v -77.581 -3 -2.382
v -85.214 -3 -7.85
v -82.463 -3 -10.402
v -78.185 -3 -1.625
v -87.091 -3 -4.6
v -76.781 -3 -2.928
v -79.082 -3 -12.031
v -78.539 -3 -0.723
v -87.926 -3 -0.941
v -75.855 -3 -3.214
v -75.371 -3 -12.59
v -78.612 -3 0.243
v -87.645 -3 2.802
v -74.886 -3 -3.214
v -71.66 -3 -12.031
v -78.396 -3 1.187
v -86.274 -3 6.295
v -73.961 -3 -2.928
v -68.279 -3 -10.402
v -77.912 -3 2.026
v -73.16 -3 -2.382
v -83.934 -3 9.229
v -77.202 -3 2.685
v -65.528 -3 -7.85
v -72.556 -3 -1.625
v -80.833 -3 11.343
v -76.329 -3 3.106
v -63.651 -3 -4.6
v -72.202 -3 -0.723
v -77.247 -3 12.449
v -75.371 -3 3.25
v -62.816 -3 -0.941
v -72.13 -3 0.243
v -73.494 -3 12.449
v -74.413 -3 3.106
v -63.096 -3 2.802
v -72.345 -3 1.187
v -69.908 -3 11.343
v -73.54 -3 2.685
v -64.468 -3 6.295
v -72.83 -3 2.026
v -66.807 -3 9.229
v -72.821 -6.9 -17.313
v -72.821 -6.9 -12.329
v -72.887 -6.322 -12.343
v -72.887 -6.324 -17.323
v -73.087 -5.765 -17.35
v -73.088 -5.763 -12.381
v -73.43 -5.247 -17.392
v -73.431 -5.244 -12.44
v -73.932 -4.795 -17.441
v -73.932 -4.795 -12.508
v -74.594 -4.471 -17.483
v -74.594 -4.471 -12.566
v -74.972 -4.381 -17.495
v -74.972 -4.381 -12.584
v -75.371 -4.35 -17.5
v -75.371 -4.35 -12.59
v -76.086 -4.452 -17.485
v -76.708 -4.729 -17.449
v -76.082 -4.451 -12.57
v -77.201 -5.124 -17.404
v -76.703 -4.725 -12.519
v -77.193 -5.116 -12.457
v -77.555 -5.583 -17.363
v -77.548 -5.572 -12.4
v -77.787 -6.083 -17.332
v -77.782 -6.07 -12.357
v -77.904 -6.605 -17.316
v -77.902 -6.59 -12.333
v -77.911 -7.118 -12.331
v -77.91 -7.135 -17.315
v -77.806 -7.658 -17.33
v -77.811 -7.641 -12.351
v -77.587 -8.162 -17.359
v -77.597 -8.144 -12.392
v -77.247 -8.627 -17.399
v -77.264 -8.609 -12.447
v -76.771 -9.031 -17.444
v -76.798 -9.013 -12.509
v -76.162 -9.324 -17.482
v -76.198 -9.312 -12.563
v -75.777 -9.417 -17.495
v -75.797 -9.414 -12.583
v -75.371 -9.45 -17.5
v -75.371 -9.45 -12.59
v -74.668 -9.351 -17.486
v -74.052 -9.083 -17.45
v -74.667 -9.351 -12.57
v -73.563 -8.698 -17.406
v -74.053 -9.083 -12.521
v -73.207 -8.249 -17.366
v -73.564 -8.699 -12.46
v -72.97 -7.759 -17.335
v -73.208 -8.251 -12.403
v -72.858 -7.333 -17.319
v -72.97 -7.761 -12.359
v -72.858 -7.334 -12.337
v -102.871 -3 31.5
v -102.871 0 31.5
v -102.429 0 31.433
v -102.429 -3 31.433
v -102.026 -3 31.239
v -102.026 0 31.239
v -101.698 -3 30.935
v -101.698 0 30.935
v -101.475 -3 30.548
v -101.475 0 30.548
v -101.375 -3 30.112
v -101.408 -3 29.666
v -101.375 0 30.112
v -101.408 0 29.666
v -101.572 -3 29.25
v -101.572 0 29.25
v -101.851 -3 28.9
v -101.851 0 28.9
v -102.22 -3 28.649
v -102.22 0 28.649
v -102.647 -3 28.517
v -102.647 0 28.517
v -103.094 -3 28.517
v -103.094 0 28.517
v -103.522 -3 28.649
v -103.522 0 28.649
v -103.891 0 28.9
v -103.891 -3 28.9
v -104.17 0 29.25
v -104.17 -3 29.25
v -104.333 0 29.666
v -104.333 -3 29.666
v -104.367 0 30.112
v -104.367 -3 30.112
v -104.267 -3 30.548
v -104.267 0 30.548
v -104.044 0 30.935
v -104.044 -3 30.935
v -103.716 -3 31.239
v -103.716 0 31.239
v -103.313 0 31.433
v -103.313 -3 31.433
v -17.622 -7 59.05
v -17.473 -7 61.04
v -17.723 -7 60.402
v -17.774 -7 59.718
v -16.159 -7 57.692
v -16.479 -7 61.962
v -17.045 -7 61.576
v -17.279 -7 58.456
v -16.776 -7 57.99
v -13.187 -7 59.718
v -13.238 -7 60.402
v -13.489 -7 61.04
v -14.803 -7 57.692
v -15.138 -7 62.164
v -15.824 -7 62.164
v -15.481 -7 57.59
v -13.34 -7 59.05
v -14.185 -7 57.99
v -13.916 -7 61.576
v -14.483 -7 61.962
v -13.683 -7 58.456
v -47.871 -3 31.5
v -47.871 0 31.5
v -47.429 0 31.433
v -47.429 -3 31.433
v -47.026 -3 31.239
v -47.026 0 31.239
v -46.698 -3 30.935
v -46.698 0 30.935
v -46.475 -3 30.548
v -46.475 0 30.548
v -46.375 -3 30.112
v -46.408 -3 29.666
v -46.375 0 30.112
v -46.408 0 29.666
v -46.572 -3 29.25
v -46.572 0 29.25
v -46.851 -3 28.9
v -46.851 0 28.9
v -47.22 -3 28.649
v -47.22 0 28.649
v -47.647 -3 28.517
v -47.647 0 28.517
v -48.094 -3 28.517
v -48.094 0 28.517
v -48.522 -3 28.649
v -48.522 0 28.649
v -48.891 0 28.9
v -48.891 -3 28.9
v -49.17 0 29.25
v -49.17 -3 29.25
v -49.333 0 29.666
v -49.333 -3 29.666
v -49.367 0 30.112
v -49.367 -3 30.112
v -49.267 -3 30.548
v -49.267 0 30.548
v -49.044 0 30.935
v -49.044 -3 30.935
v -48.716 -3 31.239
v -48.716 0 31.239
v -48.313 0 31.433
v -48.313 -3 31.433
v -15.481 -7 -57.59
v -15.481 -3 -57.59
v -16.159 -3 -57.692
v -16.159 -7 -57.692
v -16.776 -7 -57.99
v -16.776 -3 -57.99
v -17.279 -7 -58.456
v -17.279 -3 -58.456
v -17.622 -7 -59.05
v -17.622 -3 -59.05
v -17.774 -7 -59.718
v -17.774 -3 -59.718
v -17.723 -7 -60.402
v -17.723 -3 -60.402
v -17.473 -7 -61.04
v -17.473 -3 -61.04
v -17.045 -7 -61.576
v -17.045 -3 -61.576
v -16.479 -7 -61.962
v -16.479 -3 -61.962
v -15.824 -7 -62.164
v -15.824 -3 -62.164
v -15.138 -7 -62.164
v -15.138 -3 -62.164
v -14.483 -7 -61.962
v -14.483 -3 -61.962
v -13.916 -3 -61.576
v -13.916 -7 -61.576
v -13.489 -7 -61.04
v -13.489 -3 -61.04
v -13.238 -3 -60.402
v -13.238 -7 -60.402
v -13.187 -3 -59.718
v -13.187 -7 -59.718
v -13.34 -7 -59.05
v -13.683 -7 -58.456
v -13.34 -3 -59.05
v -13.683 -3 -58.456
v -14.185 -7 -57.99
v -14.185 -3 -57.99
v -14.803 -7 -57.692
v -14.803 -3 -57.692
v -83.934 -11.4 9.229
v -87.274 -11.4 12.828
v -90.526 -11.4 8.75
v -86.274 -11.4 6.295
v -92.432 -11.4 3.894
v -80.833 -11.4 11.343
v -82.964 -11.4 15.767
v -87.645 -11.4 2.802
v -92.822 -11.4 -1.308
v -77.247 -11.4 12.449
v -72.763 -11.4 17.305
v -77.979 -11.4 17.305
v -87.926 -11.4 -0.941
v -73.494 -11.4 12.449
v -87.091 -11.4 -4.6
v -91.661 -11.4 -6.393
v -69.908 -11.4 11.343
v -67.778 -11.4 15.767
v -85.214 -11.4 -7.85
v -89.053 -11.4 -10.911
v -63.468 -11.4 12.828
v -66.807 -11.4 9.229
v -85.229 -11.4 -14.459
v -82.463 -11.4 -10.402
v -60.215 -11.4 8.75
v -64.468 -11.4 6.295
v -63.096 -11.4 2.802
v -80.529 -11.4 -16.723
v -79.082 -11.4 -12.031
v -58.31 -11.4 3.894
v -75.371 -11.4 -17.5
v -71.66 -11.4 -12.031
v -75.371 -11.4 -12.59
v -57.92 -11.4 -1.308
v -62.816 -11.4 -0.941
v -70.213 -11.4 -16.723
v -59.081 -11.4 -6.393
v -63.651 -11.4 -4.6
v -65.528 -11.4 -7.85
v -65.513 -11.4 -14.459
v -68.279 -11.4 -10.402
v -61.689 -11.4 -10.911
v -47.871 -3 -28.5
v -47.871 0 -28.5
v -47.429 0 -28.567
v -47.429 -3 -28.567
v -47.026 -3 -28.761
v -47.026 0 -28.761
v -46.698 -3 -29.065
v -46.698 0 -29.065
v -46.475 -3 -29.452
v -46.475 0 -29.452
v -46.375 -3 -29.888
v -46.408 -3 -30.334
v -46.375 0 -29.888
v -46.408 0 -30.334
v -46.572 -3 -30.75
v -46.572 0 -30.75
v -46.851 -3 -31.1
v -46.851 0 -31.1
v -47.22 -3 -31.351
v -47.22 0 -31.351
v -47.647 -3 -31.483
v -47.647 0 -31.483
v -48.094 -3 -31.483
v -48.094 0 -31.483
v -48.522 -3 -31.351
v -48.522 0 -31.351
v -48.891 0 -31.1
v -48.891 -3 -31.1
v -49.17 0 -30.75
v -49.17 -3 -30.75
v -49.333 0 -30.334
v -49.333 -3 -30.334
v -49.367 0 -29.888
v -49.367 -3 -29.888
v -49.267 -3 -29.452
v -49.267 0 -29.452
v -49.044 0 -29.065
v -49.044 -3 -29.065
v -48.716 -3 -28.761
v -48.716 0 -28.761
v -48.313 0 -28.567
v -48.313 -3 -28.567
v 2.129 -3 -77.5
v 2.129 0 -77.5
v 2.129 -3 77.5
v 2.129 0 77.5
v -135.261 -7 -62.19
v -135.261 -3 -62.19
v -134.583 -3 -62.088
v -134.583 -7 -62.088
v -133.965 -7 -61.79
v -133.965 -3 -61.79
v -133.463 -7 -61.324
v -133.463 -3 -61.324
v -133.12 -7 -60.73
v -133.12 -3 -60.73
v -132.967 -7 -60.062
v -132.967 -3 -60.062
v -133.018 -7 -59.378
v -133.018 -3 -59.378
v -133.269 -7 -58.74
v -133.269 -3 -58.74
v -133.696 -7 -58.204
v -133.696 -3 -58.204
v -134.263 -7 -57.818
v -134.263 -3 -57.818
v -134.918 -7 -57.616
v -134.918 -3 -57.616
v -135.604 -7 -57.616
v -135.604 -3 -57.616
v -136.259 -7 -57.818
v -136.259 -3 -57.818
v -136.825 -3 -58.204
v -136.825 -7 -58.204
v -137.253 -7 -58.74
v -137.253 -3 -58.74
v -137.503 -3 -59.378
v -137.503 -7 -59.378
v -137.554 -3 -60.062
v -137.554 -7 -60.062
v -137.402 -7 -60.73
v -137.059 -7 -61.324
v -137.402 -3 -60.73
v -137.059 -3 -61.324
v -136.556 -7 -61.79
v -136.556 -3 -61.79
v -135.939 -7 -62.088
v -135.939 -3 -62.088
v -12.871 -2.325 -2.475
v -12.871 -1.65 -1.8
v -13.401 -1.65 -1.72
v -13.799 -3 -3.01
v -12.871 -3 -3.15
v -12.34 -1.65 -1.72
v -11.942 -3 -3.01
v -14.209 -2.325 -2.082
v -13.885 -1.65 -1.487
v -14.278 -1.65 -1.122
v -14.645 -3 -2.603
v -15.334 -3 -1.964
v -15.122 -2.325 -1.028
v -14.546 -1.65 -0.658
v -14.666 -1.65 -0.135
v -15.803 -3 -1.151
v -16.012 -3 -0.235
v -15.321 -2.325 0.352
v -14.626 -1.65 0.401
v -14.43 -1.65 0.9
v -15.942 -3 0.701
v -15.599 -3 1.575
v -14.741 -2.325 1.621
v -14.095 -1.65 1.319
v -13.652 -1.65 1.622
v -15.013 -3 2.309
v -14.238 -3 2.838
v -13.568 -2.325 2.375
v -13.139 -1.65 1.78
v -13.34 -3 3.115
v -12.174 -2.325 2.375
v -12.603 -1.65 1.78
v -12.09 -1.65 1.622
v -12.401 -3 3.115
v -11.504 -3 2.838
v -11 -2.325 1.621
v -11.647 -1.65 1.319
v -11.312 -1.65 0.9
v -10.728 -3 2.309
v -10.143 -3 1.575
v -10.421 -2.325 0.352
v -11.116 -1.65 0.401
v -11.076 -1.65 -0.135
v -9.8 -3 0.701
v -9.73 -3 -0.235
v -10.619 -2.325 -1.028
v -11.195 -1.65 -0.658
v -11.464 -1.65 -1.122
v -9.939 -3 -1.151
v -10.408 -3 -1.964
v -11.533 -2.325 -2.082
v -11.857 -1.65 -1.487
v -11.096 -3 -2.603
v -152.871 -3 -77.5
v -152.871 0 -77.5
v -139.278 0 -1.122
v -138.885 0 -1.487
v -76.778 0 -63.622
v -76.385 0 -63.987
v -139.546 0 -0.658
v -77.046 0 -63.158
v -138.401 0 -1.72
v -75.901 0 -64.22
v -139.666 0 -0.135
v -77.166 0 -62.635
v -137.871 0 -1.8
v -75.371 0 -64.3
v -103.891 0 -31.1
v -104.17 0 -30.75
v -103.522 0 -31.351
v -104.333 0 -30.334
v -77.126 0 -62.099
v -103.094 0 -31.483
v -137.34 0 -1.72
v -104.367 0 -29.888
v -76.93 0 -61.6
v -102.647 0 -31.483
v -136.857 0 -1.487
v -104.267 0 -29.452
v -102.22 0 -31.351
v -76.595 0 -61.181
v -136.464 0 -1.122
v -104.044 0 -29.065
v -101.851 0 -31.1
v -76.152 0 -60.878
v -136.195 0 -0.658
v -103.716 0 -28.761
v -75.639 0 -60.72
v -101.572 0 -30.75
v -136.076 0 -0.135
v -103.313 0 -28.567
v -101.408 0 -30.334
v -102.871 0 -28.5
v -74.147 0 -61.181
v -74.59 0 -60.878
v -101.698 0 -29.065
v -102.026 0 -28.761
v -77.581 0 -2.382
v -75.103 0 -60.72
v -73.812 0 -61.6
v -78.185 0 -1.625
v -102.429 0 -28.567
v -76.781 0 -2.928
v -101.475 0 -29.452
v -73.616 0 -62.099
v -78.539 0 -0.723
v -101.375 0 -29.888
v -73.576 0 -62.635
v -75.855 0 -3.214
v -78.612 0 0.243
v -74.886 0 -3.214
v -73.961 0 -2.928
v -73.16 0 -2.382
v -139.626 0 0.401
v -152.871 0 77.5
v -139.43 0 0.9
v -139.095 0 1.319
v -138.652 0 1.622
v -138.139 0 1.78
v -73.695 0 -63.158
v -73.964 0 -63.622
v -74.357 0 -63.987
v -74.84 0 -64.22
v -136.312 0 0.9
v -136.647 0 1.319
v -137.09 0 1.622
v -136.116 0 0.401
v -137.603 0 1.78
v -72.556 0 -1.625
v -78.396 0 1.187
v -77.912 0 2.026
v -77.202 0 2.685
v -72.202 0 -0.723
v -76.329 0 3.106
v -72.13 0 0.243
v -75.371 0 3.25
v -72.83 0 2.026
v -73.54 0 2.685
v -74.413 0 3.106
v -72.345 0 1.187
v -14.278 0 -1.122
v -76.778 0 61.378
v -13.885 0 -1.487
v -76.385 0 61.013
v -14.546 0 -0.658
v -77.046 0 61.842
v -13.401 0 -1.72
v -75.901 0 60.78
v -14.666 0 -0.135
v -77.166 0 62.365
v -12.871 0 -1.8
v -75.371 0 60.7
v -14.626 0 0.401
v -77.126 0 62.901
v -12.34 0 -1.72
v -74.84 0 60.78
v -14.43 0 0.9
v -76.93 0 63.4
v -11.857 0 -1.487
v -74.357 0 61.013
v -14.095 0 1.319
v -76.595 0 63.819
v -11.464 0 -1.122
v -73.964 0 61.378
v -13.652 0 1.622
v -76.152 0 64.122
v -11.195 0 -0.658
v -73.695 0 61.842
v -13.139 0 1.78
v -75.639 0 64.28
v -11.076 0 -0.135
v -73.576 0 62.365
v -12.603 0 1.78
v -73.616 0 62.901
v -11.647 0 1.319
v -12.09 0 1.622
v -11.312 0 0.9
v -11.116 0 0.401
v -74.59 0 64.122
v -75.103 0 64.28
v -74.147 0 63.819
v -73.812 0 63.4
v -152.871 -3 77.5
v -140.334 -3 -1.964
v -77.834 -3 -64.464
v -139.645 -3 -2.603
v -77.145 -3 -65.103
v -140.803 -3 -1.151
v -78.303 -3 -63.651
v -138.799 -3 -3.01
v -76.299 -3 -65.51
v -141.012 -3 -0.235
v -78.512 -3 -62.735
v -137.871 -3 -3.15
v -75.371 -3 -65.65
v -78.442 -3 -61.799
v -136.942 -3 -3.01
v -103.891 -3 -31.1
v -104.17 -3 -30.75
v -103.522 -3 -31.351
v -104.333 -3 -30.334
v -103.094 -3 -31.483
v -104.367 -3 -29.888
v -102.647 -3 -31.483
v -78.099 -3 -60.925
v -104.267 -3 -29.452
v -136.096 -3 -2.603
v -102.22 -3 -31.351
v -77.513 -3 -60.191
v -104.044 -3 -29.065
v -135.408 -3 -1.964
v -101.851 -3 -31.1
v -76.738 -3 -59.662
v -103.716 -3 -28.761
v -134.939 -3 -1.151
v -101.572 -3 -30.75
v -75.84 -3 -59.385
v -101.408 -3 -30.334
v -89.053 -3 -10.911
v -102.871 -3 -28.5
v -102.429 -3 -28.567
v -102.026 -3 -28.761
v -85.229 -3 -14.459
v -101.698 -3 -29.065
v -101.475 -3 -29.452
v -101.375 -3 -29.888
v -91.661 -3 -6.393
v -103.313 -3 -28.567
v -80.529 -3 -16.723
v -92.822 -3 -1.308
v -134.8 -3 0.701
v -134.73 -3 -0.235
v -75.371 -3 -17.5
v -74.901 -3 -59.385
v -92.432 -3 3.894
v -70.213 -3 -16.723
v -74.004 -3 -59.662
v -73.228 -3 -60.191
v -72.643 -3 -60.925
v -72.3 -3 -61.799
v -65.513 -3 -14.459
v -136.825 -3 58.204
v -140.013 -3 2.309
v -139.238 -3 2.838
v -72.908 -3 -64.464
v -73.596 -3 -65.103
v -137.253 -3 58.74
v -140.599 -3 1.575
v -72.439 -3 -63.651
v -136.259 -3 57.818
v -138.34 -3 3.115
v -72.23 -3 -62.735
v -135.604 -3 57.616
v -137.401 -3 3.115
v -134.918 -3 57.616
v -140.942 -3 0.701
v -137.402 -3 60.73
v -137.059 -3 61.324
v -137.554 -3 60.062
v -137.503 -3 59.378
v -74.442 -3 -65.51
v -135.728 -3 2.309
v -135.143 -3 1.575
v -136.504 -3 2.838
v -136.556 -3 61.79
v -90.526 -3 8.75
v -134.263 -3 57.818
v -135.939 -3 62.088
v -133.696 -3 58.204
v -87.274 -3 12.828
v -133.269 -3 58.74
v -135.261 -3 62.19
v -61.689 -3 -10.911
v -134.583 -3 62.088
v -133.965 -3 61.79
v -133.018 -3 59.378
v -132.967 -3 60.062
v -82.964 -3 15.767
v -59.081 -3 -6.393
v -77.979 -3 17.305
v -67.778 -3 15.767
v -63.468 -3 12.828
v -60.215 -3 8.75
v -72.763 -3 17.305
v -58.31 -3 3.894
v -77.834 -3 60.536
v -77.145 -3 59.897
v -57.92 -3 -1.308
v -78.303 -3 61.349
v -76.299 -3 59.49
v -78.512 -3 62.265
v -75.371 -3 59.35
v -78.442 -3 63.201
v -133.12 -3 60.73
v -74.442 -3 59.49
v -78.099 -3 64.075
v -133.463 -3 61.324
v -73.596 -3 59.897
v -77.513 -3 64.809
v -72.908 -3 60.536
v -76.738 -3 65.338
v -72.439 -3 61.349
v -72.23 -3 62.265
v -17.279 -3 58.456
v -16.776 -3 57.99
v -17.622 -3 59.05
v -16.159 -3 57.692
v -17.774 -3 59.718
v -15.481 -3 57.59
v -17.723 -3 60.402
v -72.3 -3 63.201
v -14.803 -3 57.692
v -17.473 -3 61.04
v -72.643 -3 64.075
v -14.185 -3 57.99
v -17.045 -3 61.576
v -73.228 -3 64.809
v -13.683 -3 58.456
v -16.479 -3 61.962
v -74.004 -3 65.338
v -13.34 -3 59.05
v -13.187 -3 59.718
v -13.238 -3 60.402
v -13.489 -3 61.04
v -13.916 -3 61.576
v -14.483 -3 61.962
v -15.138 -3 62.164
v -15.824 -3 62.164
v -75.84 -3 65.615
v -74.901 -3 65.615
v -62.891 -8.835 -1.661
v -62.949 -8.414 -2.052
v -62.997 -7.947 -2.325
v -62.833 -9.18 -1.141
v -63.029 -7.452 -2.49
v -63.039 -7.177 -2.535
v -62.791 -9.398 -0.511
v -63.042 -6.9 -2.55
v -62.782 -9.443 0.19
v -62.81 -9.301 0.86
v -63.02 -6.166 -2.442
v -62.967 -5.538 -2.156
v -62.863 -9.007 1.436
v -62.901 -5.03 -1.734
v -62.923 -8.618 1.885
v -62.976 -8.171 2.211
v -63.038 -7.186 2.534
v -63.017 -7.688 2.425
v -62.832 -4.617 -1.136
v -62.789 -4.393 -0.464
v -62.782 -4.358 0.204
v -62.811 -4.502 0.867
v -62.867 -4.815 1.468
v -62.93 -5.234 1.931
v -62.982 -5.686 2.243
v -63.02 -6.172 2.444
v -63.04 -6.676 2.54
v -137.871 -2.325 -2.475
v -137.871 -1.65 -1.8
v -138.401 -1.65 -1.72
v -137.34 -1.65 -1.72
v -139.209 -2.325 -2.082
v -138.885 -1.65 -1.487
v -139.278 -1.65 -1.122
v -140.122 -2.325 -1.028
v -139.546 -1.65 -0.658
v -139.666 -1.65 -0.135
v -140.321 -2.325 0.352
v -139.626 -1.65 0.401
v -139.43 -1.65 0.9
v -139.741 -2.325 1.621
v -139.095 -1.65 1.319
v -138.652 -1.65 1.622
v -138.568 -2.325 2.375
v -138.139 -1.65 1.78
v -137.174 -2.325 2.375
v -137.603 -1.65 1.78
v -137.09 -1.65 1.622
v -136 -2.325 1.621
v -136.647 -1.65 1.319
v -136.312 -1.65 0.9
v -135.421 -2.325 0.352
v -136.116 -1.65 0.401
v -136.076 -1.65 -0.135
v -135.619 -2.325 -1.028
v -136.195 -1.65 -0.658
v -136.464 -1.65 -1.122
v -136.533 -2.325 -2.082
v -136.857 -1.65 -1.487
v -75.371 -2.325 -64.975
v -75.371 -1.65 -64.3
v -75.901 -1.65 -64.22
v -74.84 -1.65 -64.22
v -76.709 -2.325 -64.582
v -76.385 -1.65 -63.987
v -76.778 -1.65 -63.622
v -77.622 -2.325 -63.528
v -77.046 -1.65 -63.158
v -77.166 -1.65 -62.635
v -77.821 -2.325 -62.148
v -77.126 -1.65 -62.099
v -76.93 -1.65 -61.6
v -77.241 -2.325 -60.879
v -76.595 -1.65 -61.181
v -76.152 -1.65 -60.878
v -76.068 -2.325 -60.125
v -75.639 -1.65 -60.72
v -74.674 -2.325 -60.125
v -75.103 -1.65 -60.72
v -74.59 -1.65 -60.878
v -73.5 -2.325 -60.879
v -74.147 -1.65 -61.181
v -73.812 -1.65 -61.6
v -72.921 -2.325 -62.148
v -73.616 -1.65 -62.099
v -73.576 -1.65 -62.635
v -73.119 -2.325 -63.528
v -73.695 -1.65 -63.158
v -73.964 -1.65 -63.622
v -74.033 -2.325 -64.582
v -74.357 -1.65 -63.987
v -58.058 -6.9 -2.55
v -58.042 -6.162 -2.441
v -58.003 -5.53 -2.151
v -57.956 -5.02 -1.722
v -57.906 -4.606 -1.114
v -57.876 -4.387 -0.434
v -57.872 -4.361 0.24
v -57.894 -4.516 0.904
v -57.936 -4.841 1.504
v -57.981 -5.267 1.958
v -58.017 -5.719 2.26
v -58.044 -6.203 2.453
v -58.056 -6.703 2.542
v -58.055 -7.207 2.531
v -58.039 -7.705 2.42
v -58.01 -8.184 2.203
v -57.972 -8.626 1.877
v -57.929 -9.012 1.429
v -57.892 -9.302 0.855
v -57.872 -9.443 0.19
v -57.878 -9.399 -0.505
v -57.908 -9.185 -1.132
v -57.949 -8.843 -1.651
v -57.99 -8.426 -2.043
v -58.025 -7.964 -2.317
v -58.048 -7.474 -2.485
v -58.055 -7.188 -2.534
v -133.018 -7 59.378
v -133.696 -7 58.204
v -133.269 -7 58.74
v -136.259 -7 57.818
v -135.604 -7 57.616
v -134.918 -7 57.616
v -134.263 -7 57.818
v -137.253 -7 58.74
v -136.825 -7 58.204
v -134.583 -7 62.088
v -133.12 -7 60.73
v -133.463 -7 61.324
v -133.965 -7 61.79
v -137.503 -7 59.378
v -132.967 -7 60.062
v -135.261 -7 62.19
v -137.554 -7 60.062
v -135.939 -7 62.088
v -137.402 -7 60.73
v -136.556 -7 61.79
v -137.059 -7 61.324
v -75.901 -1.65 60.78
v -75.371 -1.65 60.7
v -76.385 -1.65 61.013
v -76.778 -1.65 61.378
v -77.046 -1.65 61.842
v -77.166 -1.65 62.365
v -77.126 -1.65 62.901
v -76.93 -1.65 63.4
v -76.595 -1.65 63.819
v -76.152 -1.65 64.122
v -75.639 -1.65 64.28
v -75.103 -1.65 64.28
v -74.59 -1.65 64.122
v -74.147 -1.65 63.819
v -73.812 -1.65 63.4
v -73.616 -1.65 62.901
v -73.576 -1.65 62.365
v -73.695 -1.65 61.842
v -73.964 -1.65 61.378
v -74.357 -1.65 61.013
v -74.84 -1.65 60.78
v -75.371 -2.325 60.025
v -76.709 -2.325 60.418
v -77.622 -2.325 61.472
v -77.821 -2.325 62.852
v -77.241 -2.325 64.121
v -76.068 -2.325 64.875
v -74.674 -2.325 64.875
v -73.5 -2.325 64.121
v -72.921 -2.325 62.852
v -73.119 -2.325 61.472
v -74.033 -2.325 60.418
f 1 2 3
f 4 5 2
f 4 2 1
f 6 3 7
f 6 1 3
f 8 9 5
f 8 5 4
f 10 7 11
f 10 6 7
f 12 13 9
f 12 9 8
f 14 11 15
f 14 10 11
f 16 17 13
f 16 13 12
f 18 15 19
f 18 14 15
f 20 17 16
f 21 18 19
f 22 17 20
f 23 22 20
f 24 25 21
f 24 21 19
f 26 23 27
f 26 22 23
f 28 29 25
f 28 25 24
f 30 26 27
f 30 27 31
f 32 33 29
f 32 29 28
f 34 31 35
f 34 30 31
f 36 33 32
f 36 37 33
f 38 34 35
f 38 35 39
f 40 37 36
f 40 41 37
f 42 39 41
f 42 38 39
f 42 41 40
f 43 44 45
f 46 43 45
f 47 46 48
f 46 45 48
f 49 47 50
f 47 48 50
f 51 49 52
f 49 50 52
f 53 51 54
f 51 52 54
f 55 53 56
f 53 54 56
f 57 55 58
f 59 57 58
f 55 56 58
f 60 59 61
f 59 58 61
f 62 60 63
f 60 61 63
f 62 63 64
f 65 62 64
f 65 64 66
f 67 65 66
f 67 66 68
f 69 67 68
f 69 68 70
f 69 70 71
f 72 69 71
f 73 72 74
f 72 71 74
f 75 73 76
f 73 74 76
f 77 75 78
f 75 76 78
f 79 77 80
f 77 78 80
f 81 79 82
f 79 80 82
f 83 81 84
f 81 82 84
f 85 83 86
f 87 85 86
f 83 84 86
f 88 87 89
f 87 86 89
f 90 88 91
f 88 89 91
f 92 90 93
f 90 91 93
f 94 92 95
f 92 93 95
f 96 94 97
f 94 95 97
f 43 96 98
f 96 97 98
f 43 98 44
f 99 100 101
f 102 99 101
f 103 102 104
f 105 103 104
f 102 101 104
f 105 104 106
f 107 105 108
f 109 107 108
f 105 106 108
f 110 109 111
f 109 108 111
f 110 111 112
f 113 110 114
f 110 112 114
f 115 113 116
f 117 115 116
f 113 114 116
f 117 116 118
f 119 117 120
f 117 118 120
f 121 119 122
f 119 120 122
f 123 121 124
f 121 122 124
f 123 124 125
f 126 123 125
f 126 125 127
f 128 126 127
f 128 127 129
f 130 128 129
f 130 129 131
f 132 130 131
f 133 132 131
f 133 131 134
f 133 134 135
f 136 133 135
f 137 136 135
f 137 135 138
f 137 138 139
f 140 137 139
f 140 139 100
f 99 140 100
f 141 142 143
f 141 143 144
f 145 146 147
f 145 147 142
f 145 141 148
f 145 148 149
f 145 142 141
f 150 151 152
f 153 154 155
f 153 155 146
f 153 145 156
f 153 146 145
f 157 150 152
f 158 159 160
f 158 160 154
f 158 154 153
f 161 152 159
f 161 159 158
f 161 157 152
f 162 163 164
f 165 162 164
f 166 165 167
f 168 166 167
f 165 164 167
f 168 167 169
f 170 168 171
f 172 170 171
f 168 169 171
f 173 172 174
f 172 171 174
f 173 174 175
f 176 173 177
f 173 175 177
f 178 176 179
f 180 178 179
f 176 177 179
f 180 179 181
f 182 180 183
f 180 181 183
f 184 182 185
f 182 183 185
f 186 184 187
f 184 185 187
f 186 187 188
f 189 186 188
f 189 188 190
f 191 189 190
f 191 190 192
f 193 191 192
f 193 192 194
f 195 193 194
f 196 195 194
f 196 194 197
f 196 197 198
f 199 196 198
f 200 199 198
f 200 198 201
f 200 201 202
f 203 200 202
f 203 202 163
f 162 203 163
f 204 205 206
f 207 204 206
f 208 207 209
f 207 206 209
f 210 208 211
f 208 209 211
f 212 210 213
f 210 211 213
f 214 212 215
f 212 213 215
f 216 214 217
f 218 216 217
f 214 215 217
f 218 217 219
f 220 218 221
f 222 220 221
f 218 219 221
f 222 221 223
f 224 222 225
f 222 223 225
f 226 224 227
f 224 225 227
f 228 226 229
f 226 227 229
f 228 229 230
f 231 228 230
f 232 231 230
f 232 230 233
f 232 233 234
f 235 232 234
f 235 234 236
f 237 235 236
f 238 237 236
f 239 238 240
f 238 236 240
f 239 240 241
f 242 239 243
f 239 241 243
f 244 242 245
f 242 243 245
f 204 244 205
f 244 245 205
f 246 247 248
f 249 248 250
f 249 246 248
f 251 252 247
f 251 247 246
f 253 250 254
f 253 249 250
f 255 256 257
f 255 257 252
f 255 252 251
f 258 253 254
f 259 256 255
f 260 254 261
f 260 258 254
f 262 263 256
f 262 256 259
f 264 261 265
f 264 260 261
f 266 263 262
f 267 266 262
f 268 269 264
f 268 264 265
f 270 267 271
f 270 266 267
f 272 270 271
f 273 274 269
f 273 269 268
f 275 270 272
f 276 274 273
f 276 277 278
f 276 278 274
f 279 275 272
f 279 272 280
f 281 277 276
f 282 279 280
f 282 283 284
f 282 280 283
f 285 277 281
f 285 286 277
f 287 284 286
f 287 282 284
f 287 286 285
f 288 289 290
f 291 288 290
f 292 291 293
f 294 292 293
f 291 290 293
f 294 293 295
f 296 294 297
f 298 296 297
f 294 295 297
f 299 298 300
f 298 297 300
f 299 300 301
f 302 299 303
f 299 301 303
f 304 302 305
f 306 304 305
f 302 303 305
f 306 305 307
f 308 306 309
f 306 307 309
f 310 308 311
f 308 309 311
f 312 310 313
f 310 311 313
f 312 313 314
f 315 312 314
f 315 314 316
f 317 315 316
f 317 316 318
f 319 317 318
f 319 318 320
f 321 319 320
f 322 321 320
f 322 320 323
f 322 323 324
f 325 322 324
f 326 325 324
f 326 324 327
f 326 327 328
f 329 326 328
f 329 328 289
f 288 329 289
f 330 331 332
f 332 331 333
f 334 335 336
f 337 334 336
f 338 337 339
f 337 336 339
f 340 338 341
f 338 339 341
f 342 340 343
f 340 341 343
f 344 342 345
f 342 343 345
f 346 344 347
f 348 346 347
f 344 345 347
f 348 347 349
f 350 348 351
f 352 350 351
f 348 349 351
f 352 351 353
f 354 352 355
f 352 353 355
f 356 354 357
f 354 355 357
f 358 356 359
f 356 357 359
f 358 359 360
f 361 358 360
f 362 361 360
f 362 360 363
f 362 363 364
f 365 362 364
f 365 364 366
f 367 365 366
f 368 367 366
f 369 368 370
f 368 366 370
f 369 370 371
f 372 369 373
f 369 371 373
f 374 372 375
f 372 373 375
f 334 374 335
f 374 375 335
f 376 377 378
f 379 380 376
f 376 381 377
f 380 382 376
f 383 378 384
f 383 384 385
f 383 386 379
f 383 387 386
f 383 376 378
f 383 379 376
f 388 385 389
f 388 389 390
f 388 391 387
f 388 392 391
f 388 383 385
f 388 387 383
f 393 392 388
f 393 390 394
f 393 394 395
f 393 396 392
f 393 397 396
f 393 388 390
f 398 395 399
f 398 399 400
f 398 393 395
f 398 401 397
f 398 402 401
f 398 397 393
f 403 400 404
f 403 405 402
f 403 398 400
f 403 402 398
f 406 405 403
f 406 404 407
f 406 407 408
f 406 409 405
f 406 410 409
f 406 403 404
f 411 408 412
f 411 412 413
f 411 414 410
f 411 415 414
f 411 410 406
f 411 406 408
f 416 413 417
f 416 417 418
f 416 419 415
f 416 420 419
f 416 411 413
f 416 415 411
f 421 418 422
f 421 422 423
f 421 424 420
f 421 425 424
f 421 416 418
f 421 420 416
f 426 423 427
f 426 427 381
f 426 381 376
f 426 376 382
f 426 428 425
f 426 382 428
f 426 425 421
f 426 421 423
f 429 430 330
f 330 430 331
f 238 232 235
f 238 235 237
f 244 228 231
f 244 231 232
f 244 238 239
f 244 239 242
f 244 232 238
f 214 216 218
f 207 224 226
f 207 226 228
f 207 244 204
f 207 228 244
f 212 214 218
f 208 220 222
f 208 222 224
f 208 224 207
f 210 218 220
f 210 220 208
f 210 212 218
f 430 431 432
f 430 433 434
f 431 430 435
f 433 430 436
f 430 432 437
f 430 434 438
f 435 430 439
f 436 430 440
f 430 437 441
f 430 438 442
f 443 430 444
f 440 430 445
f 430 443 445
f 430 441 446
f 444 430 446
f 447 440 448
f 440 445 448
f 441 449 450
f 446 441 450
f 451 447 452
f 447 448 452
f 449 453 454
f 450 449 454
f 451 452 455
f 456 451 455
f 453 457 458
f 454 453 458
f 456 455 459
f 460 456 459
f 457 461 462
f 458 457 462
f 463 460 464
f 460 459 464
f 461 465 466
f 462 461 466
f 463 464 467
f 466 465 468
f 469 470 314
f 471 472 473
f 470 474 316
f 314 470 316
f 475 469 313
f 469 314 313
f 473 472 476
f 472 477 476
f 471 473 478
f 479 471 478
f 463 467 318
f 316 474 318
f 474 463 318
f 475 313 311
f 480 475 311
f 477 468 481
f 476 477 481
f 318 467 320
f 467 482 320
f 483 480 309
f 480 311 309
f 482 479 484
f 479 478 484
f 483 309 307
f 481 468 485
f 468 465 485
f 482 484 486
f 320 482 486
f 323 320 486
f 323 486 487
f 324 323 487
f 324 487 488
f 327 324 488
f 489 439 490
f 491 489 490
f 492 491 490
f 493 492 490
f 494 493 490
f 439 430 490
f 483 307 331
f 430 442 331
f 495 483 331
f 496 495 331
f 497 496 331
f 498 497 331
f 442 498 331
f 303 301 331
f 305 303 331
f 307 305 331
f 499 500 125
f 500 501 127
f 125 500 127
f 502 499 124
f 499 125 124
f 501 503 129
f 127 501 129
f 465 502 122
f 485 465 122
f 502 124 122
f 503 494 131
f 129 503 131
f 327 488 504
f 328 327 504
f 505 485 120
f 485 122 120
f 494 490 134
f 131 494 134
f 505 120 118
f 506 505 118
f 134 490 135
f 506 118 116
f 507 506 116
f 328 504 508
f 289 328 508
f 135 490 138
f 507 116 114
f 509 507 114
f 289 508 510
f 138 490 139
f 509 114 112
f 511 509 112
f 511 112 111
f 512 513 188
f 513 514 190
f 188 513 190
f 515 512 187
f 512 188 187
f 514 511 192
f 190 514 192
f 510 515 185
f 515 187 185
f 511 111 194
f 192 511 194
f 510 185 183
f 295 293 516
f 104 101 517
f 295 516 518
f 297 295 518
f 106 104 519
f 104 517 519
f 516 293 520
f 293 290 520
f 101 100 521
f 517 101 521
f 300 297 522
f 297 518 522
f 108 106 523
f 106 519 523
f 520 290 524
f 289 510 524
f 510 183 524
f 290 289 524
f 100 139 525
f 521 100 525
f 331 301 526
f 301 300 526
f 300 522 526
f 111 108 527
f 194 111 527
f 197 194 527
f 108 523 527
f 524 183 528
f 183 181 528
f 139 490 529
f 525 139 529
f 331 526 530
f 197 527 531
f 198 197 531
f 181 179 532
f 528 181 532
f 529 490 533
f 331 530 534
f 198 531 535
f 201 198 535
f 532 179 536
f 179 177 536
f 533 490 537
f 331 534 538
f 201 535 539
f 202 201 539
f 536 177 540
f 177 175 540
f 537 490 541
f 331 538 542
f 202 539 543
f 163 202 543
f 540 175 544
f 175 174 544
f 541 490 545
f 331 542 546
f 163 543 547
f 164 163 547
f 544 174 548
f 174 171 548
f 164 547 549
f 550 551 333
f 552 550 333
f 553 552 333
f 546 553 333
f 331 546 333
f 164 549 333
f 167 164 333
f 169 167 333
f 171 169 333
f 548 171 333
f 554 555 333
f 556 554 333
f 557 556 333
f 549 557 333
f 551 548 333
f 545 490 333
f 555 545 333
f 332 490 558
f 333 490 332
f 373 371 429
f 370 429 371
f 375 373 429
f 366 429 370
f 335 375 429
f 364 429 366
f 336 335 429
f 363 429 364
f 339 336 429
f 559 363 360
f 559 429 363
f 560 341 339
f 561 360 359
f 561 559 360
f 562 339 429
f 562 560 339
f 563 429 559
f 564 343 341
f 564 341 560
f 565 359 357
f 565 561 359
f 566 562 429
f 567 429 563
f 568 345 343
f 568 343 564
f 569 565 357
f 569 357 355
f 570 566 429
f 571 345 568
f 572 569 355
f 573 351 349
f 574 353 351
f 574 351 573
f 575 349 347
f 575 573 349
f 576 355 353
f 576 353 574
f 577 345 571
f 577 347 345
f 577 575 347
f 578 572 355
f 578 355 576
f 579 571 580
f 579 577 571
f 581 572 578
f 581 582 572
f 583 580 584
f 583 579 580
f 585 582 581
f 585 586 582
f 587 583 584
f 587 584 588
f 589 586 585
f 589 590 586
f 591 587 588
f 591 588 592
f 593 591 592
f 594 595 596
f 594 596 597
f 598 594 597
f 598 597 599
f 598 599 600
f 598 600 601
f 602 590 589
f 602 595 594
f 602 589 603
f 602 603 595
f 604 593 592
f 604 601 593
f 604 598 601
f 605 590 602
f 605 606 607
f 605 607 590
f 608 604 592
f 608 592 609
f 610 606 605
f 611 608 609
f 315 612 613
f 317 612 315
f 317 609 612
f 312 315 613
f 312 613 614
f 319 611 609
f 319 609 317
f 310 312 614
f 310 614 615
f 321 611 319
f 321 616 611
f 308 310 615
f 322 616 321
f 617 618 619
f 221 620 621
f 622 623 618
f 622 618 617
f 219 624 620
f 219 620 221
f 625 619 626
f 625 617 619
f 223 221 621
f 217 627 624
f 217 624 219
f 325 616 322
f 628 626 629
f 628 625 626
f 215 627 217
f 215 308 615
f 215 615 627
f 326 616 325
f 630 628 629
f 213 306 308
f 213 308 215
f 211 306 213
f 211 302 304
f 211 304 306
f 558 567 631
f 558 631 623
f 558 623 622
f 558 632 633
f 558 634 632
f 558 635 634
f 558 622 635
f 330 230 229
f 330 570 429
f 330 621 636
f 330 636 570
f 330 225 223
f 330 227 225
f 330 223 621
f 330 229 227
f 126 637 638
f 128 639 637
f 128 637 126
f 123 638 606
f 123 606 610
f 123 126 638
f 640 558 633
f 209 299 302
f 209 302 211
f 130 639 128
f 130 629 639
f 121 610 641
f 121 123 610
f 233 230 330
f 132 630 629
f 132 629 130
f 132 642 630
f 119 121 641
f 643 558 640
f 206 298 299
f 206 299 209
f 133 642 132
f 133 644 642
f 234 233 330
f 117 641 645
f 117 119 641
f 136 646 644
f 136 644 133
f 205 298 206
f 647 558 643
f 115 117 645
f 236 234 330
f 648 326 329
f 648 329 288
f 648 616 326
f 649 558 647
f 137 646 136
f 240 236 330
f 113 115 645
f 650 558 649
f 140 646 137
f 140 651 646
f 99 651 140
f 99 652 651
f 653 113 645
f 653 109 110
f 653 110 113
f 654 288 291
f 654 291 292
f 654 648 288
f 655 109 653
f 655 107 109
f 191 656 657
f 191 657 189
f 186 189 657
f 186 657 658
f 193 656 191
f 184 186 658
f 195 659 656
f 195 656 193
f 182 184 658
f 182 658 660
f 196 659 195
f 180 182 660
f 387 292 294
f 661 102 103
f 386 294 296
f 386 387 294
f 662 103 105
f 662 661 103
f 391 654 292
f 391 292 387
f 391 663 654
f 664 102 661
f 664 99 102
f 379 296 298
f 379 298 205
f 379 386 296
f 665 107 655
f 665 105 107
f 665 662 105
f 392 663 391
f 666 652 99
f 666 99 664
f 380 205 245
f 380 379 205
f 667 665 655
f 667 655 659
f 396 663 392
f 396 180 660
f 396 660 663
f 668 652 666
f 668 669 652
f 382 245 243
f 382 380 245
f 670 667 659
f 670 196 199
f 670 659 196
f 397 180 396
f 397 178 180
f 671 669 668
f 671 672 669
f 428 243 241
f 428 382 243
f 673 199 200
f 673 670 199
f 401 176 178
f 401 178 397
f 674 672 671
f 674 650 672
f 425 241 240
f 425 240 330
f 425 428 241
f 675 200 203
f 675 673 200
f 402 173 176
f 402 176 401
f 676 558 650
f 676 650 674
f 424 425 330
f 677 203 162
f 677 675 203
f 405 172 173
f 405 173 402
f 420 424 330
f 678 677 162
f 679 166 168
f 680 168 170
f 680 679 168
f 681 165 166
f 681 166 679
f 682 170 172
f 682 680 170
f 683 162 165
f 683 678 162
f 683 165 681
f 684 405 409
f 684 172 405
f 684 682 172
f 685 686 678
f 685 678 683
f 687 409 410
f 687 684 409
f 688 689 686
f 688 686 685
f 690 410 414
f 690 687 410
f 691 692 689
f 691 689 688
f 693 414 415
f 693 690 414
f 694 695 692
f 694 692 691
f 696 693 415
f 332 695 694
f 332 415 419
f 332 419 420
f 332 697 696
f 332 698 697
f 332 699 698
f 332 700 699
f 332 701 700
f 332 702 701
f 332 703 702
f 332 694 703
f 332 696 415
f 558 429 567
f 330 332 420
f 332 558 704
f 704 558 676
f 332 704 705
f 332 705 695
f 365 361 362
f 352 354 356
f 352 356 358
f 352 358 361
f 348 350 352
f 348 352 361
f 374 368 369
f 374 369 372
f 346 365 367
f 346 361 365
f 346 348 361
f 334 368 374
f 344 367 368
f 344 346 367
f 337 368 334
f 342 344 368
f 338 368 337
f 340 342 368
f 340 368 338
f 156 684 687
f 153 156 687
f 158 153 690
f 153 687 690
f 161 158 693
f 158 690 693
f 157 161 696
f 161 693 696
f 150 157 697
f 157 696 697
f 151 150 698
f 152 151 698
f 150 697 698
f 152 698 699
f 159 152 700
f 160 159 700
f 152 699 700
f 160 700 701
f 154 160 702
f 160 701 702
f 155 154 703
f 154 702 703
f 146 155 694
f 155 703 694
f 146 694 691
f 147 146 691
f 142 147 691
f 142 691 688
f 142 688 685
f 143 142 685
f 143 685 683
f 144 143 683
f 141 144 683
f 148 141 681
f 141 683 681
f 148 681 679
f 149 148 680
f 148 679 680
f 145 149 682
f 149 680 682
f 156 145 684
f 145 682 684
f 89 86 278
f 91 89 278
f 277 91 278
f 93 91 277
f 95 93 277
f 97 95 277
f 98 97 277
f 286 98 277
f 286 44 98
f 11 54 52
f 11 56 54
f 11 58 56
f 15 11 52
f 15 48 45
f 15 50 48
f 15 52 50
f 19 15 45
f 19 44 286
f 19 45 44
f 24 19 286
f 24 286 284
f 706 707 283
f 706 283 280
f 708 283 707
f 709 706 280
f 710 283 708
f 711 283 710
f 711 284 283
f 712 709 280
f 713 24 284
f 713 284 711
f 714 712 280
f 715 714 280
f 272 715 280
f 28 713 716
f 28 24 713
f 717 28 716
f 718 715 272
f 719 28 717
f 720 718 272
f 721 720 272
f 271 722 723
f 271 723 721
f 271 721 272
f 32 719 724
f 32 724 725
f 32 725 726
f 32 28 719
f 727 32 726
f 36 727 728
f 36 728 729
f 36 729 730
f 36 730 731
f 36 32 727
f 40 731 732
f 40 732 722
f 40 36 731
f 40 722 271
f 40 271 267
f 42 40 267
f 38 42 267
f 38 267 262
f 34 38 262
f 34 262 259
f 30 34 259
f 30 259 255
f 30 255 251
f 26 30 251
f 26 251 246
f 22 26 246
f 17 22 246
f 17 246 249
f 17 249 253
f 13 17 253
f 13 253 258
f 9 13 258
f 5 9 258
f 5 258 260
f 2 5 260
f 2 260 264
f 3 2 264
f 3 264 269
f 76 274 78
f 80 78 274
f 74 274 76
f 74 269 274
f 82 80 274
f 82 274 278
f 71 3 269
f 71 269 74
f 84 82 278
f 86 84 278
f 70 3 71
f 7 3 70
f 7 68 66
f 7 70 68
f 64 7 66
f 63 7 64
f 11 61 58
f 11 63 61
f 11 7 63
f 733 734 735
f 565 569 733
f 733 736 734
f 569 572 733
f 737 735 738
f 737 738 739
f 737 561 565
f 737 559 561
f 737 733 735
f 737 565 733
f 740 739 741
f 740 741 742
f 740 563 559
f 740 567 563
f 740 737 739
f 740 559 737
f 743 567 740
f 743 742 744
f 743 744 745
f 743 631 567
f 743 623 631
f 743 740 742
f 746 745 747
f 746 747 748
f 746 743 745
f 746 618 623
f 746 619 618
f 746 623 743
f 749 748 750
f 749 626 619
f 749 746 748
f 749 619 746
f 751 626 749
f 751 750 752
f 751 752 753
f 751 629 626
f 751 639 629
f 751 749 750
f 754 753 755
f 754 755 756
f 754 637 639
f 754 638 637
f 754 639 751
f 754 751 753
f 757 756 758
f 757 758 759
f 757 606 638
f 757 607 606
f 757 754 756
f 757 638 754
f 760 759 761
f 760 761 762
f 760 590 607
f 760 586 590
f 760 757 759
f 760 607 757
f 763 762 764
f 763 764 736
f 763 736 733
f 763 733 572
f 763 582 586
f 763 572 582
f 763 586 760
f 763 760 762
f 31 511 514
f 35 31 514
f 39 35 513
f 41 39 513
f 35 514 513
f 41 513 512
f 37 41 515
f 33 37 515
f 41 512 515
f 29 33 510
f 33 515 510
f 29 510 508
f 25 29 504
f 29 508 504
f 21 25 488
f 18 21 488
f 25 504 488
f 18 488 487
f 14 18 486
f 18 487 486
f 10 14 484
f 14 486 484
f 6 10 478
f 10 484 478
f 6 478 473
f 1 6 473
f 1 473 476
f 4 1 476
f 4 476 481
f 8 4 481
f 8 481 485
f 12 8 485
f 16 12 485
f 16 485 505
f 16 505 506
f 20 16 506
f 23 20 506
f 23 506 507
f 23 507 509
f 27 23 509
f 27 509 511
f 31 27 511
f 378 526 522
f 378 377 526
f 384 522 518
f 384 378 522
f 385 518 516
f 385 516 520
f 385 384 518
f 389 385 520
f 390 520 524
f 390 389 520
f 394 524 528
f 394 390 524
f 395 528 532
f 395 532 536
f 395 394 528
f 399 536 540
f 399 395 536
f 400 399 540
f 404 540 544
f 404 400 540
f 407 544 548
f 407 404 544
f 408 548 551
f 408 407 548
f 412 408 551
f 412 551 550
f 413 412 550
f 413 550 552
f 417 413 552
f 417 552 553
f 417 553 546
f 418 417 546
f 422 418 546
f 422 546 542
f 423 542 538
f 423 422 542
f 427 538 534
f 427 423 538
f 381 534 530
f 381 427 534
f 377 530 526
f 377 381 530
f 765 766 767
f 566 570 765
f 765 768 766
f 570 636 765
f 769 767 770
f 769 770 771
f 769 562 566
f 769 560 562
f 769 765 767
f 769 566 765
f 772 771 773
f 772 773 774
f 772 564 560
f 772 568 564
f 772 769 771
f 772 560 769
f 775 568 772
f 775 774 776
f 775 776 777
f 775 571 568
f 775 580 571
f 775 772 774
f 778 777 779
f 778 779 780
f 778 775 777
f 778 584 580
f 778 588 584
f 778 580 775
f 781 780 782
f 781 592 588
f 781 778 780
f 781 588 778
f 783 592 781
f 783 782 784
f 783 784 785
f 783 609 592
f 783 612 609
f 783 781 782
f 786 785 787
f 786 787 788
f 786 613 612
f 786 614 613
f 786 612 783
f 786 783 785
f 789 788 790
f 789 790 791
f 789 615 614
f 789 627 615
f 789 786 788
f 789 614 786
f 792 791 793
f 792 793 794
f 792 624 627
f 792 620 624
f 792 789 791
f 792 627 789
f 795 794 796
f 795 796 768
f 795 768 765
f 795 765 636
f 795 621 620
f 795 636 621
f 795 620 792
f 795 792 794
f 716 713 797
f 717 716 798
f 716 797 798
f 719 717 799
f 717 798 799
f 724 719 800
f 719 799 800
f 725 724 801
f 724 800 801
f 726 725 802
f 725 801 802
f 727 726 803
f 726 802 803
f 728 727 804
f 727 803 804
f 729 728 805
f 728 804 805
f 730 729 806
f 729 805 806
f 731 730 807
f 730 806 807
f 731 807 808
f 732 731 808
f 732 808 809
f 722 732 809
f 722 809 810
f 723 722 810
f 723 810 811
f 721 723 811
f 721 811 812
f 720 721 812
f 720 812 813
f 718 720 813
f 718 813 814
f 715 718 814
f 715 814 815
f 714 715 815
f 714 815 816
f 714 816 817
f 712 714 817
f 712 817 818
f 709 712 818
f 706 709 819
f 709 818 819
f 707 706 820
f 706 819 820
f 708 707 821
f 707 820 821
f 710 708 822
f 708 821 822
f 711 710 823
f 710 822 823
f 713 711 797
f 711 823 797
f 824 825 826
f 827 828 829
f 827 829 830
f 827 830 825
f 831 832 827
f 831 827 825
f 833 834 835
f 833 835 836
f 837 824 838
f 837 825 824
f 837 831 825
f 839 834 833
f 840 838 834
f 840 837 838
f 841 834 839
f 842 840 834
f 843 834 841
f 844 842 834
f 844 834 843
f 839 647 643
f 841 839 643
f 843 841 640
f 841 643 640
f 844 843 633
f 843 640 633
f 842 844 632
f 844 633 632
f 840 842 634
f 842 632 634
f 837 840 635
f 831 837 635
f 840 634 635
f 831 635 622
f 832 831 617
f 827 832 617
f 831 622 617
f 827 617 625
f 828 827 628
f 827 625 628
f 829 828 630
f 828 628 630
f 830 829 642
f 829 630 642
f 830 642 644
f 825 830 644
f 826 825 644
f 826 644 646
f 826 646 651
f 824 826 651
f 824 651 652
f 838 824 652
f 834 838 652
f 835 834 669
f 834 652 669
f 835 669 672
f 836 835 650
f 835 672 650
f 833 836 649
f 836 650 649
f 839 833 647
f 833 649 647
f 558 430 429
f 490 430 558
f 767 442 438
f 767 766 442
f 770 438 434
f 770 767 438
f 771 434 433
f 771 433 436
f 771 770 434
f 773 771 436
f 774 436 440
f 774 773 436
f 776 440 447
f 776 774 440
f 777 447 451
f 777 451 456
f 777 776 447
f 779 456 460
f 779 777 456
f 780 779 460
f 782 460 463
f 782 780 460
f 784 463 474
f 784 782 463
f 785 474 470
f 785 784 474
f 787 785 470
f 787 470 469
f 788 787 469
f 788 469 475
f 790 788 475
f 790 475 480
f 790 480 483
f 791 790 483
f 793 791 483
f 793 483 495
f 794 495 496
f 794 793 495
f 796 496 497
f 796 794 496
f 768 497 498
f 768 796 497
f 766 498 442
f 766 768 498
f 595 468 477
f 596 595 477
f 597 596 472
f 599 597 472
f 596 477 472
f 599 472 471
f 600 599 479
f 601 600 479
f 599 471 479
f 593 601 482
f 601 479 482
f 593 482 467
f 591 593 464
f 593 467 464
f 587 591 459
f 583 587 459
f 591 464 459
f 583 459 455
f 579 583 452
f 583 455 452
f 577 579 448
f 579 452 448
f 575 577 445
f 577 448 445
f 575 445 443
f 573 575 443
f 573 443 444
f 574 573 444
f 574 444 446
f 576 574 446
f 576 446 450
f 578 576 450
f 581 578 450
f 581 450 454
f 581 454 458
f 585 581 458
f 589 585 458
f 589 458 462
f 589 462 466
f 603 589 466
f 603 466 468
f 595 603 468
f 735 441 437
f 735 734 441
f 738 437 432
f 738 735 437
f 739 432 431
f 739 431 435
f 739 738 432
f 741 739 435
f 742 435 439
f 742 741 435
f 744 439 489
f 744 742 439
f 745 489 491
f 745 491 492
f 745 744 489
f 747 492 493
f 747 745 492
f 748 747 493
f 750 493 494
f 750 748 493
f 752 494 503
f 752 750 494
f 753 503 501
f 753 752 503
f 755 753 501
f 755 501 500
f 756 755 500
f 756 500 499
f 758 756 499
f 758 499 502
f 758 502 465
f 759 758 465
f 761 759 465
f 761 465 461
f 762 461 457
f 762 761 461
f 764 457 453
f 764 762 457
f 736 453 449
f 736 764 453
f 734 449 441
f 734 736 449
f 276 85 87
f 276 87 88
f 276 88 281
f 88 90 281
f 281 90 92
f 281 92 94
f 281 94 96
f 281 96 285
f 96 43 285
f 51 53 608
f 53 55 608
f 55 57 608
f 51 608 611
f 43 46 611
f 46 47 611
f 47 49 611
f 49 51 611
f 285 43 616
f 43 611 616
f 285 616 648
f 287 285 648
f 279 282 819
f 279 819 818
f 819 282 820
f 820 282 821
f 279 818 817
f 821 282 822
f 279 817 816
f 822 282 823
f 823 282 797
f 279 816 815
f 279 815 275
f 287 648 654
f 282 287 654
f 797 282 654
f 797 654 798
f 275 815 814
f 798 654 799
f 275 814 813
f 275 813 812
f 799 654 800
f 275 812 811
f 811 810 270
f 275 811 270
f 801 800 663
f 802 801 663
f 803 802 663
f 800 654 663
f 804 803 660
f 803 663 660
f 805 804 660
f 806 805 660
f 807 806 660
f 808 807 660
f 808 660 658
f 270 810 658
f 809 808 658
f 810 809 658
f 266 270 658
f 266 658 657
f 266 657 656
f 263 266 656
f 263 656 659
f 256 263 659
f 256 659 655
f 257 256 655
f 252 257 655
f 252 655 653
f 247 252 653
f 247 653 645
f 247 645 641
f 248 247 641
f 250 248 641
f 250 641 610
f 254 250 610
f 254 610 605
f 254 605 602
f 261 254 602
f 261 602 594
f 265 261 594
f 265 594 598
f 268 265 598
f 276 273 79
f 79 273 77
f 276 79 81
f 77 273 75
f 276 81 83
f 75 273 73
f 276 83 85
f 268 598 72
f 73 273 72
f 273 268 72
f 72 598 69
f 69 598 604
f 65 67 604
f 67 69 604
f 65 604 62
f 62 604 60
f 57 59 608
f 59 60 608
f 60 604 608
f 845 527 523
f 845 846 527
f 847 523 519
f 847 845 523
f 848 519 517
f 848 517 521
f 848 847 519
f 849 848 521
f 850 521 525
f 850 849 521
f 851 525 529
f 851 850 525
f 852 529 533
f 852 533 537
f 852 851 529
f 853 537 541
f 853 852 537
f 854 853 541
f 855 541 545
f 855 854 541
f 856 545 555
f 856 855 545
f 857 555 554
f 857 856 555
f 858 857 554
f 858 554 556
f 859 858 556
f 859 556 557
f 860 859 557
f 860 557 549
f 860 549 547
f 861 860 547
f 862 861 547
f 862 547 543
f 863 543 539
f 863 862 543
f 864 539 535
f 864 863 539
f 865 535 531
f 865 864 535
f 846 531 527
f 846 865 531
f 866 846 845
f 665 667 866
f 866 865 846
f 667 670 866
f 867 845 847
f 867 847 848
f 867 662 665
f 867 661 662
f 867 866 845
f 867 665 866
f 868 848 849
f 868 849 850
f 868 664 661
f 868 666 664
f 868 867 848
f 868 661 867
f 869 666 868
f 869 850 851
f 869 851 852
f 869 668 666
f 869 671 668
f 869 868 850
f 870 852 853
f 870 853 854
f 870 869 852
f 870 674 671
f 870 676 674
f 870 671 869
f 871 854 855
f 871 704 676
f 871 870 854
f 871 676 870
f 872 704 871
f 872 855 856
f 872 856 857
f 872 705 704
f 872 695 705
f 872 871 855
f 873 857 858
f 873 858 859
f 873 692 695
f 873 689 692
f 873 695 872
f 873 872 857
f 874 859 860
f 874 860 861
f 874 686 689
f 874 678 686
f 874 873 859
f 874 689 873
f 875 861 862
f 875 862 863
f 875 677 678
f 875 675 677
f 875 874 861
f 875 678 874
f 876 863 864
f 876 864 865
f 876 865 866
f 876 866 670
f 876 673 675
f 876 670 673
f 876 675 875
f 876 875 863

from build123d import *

# Parameters (mm, degrees)
SKETCH10_W                                     = 155
SKETCH10_H                                     = 155
BOSS_EXTRUDE3_DEPTH                            = 3
SKETCH11_R                                     = 17.5
SKETCH11_R_2                                   = 12.59
BOSS_EXTRUDE4_DEPTH                            = 8.4
SKETCH11_4_R                                   = 2.3
BOSS_EXTRUDE6_DEPTH                            = 4
SKETCH12_R                                     = 2.55
CUT_EXTRUDE1_DEPTH                             = 37
SKETCH14_R                                     = 2.55
CUT_EXTRUDE2_DEPTH                             = 75
SKETCH15_R                                     = 1.5
SKETCH15_R_2                                   = 3.25
CUT_EXTRUDE3_DEPTH                             = 95
CSK_FOR_M3_FLAT_HEAD_MACHINE_SCREW1_AT_2_COUNT = 2
CSK_FOR_M3_FLAT_HEAD_MACHINE_SCREW1_AT_2_PITCH = 88.388347648
CSK_FOR_M3_FLAT_HEAD_MACHINE_SCREW1_AT_3_COUNT = 2
CSK_FOR_M3_FLAT_HEAD_MACHINE_SCREW1_AT_3_PITCH = 125
CSK_FOR_M3_FLAT_HEAD_MACHINE_SCREW1_AT_4_COUNT = 2
CSK_FOR_M3_FLAT_HEAD_MACHINE_SCREW1_AT_4_PITCH = 88.388347648


with BuildPart() as part:
    # Sketch10 → Boss-Extrude3 (new body)
    with BuildSketch(Plane.XZ):
        with Locations((-75.370825338, 0)):
            Rectangle(SKETCH10_W, SKETCH10_H)
    extrude(amount=BOSS_EXTRUDE3_DEPTH)

    # Sketch11 → Boss-Extrude4 (add)
    with BuildSketch(Plane.XZ.offset(3)):
        with Locations((-75.370825338, 0)):
            Circle(SKETCH11_R)
        with Locations((-75.370825338, 0)):
            Circle(SKETCH11_R_2, mode=Mode.SUBTRACT)
    extrude(amount=BOSS_EXTRUDE4_DEPTH)

    # Sketch11<4> → Boss-Extrude6 (add)
    with BuildSketch(Plane.XZ.offset(3)):
        with Locations((-135.260825338, 59.89)):
            Circle(SKETCH11_4_R)
        with Locations((-15.480825338, 59.89)):
            Circle(SKETCH11_4_R)
        with Locations((-15.480825338, -59.89)):
            Circle(SKETCH11_4_R)
        with Locations((-135.260825338, -59.89)):
            Circle(SKETCH11_4_R)
    extrude(amount=BOSS_EXTRUDE6_DEPTH)

    # Sketch12 → Cut-Extrude1 (cut)
    with BuildSketch(Plane.XY):
        with Locations((-75.370825338, -6.9)):
            Circle(SKETCH12_R)
    extrude(amount=-CUT_EXTRUDE1_DEPTH, mode=Mode.SUBTRACT)

    # Sketch14 → Cut-Extrude2 (cut)
    with BuildSketch(Plane(origin=(0, 0, 0), x_dir=(0, 0, -1), z_dir=(1, 0, 0))):
        with Locations((0, -6.9)):
            Circle(SKETCH14_R)
    extrude(amount=-CUT_EXTRUDE2_DEPTH, mode=Mode.SUBTRACT)

    # Sketch15 → Cut-Extrude3 (cut)
    with BuildSketch(Plane(origin=(0, 0, 0), x_dir=(1, 0, 0), z_dir=(0, 1, 0))):
        with Locations((-102.870825338, 30)):
            Circle(SKETCH15_R)
        with Locations((-47.870825338, 30)):
            Circle(SKETCH15_R)
        with Locations((-47.870825338, -30)):
            Circle(SKETCH15_R)
        with Locations((-102.870825338, -30)):
            Circle(SKETCH15_R)
        with Locations((-75.370825338, 0)):
            Circle(SKETCH15_R_2)
    extrude(amount=-CUT_EXTRUDE3_DEPTH, mode=Mode.SUBTRACT)

    # Sketch18 → CSK for M3 Flat Head Machine Screw1 (revolve, cut)
    with BuildSketch(Plane(origin=(-75.370825338, -3, -62.5), x_dir=(0, 0, -1), z_dir=(1, 0, 0))):
        Polygon((0, 0), (0, 3), (1.8, 3), (1.8, 1.35), (3.15, 0), align=None)
    csk_for_m3_flat_head_machine_screw1 = revolve(axis=Axis((-75.370825338, -9.35, -62.5), (0, 1, 0)), mode=Mode.SUBTRACT)

    # CSK for M3 Flat Head Machine Screw1 at 2: CSK for M3 Flat Head Machine Screw1 ×2
    with Locations(*[Vector(0.7071067811865477, 0, 0.7071067811865474) * (i * CSK_FOR_M3_FLAT_HEAD_MACHINE_SCREW1_AT_2_PITCH) for i in range(1, CSK_FOR_M3_FLAT_HEAD_MACHINE_SCREW1_AT_2_COUNT)]):
        add(csk_for_m3_flat_head_machine_screw1, mode=Mode.SUBTRACT)

    # CSK for M3 Flat Head Machine Screw1 at 3: CSK for M3 Flat Head Machine Screw1 ×2
    with Locations(*[(0, 0, i * CSK_FOR_M3_FLAT_HEAD_MACHINE_SCREW1_AT_3_PITCH) for i in range(1, CSK_FOR_M3_FLAT_HEAD_MACHINE_SCREW1_AT_3_COUNT)]):
        add(csk_for_m3_flat_head_machine_screw1, mode=Mode.SUBTRACT)

    # CSK for M3 Flat Head Machine Screw1 at 4: CSK for M3 Flat Head Machine Screw1 ×2
    with Locations(*[Vector(-0.7071067811865479, 0, 0.7071067811865472) * (i * CSK_FOR_M3_FLAT_HEAD_MACHINE_SCREW1_AT_4_PITCH) for i in range(1, CSK_FOR_M3_FLAT_HEAD_MACHINE_SCREW1_AT_4_COUNT)]):
        add(csk_for_m3_flat_head_machine_screw1, mode=Mode.SUBTRACT)


solid = part.part
